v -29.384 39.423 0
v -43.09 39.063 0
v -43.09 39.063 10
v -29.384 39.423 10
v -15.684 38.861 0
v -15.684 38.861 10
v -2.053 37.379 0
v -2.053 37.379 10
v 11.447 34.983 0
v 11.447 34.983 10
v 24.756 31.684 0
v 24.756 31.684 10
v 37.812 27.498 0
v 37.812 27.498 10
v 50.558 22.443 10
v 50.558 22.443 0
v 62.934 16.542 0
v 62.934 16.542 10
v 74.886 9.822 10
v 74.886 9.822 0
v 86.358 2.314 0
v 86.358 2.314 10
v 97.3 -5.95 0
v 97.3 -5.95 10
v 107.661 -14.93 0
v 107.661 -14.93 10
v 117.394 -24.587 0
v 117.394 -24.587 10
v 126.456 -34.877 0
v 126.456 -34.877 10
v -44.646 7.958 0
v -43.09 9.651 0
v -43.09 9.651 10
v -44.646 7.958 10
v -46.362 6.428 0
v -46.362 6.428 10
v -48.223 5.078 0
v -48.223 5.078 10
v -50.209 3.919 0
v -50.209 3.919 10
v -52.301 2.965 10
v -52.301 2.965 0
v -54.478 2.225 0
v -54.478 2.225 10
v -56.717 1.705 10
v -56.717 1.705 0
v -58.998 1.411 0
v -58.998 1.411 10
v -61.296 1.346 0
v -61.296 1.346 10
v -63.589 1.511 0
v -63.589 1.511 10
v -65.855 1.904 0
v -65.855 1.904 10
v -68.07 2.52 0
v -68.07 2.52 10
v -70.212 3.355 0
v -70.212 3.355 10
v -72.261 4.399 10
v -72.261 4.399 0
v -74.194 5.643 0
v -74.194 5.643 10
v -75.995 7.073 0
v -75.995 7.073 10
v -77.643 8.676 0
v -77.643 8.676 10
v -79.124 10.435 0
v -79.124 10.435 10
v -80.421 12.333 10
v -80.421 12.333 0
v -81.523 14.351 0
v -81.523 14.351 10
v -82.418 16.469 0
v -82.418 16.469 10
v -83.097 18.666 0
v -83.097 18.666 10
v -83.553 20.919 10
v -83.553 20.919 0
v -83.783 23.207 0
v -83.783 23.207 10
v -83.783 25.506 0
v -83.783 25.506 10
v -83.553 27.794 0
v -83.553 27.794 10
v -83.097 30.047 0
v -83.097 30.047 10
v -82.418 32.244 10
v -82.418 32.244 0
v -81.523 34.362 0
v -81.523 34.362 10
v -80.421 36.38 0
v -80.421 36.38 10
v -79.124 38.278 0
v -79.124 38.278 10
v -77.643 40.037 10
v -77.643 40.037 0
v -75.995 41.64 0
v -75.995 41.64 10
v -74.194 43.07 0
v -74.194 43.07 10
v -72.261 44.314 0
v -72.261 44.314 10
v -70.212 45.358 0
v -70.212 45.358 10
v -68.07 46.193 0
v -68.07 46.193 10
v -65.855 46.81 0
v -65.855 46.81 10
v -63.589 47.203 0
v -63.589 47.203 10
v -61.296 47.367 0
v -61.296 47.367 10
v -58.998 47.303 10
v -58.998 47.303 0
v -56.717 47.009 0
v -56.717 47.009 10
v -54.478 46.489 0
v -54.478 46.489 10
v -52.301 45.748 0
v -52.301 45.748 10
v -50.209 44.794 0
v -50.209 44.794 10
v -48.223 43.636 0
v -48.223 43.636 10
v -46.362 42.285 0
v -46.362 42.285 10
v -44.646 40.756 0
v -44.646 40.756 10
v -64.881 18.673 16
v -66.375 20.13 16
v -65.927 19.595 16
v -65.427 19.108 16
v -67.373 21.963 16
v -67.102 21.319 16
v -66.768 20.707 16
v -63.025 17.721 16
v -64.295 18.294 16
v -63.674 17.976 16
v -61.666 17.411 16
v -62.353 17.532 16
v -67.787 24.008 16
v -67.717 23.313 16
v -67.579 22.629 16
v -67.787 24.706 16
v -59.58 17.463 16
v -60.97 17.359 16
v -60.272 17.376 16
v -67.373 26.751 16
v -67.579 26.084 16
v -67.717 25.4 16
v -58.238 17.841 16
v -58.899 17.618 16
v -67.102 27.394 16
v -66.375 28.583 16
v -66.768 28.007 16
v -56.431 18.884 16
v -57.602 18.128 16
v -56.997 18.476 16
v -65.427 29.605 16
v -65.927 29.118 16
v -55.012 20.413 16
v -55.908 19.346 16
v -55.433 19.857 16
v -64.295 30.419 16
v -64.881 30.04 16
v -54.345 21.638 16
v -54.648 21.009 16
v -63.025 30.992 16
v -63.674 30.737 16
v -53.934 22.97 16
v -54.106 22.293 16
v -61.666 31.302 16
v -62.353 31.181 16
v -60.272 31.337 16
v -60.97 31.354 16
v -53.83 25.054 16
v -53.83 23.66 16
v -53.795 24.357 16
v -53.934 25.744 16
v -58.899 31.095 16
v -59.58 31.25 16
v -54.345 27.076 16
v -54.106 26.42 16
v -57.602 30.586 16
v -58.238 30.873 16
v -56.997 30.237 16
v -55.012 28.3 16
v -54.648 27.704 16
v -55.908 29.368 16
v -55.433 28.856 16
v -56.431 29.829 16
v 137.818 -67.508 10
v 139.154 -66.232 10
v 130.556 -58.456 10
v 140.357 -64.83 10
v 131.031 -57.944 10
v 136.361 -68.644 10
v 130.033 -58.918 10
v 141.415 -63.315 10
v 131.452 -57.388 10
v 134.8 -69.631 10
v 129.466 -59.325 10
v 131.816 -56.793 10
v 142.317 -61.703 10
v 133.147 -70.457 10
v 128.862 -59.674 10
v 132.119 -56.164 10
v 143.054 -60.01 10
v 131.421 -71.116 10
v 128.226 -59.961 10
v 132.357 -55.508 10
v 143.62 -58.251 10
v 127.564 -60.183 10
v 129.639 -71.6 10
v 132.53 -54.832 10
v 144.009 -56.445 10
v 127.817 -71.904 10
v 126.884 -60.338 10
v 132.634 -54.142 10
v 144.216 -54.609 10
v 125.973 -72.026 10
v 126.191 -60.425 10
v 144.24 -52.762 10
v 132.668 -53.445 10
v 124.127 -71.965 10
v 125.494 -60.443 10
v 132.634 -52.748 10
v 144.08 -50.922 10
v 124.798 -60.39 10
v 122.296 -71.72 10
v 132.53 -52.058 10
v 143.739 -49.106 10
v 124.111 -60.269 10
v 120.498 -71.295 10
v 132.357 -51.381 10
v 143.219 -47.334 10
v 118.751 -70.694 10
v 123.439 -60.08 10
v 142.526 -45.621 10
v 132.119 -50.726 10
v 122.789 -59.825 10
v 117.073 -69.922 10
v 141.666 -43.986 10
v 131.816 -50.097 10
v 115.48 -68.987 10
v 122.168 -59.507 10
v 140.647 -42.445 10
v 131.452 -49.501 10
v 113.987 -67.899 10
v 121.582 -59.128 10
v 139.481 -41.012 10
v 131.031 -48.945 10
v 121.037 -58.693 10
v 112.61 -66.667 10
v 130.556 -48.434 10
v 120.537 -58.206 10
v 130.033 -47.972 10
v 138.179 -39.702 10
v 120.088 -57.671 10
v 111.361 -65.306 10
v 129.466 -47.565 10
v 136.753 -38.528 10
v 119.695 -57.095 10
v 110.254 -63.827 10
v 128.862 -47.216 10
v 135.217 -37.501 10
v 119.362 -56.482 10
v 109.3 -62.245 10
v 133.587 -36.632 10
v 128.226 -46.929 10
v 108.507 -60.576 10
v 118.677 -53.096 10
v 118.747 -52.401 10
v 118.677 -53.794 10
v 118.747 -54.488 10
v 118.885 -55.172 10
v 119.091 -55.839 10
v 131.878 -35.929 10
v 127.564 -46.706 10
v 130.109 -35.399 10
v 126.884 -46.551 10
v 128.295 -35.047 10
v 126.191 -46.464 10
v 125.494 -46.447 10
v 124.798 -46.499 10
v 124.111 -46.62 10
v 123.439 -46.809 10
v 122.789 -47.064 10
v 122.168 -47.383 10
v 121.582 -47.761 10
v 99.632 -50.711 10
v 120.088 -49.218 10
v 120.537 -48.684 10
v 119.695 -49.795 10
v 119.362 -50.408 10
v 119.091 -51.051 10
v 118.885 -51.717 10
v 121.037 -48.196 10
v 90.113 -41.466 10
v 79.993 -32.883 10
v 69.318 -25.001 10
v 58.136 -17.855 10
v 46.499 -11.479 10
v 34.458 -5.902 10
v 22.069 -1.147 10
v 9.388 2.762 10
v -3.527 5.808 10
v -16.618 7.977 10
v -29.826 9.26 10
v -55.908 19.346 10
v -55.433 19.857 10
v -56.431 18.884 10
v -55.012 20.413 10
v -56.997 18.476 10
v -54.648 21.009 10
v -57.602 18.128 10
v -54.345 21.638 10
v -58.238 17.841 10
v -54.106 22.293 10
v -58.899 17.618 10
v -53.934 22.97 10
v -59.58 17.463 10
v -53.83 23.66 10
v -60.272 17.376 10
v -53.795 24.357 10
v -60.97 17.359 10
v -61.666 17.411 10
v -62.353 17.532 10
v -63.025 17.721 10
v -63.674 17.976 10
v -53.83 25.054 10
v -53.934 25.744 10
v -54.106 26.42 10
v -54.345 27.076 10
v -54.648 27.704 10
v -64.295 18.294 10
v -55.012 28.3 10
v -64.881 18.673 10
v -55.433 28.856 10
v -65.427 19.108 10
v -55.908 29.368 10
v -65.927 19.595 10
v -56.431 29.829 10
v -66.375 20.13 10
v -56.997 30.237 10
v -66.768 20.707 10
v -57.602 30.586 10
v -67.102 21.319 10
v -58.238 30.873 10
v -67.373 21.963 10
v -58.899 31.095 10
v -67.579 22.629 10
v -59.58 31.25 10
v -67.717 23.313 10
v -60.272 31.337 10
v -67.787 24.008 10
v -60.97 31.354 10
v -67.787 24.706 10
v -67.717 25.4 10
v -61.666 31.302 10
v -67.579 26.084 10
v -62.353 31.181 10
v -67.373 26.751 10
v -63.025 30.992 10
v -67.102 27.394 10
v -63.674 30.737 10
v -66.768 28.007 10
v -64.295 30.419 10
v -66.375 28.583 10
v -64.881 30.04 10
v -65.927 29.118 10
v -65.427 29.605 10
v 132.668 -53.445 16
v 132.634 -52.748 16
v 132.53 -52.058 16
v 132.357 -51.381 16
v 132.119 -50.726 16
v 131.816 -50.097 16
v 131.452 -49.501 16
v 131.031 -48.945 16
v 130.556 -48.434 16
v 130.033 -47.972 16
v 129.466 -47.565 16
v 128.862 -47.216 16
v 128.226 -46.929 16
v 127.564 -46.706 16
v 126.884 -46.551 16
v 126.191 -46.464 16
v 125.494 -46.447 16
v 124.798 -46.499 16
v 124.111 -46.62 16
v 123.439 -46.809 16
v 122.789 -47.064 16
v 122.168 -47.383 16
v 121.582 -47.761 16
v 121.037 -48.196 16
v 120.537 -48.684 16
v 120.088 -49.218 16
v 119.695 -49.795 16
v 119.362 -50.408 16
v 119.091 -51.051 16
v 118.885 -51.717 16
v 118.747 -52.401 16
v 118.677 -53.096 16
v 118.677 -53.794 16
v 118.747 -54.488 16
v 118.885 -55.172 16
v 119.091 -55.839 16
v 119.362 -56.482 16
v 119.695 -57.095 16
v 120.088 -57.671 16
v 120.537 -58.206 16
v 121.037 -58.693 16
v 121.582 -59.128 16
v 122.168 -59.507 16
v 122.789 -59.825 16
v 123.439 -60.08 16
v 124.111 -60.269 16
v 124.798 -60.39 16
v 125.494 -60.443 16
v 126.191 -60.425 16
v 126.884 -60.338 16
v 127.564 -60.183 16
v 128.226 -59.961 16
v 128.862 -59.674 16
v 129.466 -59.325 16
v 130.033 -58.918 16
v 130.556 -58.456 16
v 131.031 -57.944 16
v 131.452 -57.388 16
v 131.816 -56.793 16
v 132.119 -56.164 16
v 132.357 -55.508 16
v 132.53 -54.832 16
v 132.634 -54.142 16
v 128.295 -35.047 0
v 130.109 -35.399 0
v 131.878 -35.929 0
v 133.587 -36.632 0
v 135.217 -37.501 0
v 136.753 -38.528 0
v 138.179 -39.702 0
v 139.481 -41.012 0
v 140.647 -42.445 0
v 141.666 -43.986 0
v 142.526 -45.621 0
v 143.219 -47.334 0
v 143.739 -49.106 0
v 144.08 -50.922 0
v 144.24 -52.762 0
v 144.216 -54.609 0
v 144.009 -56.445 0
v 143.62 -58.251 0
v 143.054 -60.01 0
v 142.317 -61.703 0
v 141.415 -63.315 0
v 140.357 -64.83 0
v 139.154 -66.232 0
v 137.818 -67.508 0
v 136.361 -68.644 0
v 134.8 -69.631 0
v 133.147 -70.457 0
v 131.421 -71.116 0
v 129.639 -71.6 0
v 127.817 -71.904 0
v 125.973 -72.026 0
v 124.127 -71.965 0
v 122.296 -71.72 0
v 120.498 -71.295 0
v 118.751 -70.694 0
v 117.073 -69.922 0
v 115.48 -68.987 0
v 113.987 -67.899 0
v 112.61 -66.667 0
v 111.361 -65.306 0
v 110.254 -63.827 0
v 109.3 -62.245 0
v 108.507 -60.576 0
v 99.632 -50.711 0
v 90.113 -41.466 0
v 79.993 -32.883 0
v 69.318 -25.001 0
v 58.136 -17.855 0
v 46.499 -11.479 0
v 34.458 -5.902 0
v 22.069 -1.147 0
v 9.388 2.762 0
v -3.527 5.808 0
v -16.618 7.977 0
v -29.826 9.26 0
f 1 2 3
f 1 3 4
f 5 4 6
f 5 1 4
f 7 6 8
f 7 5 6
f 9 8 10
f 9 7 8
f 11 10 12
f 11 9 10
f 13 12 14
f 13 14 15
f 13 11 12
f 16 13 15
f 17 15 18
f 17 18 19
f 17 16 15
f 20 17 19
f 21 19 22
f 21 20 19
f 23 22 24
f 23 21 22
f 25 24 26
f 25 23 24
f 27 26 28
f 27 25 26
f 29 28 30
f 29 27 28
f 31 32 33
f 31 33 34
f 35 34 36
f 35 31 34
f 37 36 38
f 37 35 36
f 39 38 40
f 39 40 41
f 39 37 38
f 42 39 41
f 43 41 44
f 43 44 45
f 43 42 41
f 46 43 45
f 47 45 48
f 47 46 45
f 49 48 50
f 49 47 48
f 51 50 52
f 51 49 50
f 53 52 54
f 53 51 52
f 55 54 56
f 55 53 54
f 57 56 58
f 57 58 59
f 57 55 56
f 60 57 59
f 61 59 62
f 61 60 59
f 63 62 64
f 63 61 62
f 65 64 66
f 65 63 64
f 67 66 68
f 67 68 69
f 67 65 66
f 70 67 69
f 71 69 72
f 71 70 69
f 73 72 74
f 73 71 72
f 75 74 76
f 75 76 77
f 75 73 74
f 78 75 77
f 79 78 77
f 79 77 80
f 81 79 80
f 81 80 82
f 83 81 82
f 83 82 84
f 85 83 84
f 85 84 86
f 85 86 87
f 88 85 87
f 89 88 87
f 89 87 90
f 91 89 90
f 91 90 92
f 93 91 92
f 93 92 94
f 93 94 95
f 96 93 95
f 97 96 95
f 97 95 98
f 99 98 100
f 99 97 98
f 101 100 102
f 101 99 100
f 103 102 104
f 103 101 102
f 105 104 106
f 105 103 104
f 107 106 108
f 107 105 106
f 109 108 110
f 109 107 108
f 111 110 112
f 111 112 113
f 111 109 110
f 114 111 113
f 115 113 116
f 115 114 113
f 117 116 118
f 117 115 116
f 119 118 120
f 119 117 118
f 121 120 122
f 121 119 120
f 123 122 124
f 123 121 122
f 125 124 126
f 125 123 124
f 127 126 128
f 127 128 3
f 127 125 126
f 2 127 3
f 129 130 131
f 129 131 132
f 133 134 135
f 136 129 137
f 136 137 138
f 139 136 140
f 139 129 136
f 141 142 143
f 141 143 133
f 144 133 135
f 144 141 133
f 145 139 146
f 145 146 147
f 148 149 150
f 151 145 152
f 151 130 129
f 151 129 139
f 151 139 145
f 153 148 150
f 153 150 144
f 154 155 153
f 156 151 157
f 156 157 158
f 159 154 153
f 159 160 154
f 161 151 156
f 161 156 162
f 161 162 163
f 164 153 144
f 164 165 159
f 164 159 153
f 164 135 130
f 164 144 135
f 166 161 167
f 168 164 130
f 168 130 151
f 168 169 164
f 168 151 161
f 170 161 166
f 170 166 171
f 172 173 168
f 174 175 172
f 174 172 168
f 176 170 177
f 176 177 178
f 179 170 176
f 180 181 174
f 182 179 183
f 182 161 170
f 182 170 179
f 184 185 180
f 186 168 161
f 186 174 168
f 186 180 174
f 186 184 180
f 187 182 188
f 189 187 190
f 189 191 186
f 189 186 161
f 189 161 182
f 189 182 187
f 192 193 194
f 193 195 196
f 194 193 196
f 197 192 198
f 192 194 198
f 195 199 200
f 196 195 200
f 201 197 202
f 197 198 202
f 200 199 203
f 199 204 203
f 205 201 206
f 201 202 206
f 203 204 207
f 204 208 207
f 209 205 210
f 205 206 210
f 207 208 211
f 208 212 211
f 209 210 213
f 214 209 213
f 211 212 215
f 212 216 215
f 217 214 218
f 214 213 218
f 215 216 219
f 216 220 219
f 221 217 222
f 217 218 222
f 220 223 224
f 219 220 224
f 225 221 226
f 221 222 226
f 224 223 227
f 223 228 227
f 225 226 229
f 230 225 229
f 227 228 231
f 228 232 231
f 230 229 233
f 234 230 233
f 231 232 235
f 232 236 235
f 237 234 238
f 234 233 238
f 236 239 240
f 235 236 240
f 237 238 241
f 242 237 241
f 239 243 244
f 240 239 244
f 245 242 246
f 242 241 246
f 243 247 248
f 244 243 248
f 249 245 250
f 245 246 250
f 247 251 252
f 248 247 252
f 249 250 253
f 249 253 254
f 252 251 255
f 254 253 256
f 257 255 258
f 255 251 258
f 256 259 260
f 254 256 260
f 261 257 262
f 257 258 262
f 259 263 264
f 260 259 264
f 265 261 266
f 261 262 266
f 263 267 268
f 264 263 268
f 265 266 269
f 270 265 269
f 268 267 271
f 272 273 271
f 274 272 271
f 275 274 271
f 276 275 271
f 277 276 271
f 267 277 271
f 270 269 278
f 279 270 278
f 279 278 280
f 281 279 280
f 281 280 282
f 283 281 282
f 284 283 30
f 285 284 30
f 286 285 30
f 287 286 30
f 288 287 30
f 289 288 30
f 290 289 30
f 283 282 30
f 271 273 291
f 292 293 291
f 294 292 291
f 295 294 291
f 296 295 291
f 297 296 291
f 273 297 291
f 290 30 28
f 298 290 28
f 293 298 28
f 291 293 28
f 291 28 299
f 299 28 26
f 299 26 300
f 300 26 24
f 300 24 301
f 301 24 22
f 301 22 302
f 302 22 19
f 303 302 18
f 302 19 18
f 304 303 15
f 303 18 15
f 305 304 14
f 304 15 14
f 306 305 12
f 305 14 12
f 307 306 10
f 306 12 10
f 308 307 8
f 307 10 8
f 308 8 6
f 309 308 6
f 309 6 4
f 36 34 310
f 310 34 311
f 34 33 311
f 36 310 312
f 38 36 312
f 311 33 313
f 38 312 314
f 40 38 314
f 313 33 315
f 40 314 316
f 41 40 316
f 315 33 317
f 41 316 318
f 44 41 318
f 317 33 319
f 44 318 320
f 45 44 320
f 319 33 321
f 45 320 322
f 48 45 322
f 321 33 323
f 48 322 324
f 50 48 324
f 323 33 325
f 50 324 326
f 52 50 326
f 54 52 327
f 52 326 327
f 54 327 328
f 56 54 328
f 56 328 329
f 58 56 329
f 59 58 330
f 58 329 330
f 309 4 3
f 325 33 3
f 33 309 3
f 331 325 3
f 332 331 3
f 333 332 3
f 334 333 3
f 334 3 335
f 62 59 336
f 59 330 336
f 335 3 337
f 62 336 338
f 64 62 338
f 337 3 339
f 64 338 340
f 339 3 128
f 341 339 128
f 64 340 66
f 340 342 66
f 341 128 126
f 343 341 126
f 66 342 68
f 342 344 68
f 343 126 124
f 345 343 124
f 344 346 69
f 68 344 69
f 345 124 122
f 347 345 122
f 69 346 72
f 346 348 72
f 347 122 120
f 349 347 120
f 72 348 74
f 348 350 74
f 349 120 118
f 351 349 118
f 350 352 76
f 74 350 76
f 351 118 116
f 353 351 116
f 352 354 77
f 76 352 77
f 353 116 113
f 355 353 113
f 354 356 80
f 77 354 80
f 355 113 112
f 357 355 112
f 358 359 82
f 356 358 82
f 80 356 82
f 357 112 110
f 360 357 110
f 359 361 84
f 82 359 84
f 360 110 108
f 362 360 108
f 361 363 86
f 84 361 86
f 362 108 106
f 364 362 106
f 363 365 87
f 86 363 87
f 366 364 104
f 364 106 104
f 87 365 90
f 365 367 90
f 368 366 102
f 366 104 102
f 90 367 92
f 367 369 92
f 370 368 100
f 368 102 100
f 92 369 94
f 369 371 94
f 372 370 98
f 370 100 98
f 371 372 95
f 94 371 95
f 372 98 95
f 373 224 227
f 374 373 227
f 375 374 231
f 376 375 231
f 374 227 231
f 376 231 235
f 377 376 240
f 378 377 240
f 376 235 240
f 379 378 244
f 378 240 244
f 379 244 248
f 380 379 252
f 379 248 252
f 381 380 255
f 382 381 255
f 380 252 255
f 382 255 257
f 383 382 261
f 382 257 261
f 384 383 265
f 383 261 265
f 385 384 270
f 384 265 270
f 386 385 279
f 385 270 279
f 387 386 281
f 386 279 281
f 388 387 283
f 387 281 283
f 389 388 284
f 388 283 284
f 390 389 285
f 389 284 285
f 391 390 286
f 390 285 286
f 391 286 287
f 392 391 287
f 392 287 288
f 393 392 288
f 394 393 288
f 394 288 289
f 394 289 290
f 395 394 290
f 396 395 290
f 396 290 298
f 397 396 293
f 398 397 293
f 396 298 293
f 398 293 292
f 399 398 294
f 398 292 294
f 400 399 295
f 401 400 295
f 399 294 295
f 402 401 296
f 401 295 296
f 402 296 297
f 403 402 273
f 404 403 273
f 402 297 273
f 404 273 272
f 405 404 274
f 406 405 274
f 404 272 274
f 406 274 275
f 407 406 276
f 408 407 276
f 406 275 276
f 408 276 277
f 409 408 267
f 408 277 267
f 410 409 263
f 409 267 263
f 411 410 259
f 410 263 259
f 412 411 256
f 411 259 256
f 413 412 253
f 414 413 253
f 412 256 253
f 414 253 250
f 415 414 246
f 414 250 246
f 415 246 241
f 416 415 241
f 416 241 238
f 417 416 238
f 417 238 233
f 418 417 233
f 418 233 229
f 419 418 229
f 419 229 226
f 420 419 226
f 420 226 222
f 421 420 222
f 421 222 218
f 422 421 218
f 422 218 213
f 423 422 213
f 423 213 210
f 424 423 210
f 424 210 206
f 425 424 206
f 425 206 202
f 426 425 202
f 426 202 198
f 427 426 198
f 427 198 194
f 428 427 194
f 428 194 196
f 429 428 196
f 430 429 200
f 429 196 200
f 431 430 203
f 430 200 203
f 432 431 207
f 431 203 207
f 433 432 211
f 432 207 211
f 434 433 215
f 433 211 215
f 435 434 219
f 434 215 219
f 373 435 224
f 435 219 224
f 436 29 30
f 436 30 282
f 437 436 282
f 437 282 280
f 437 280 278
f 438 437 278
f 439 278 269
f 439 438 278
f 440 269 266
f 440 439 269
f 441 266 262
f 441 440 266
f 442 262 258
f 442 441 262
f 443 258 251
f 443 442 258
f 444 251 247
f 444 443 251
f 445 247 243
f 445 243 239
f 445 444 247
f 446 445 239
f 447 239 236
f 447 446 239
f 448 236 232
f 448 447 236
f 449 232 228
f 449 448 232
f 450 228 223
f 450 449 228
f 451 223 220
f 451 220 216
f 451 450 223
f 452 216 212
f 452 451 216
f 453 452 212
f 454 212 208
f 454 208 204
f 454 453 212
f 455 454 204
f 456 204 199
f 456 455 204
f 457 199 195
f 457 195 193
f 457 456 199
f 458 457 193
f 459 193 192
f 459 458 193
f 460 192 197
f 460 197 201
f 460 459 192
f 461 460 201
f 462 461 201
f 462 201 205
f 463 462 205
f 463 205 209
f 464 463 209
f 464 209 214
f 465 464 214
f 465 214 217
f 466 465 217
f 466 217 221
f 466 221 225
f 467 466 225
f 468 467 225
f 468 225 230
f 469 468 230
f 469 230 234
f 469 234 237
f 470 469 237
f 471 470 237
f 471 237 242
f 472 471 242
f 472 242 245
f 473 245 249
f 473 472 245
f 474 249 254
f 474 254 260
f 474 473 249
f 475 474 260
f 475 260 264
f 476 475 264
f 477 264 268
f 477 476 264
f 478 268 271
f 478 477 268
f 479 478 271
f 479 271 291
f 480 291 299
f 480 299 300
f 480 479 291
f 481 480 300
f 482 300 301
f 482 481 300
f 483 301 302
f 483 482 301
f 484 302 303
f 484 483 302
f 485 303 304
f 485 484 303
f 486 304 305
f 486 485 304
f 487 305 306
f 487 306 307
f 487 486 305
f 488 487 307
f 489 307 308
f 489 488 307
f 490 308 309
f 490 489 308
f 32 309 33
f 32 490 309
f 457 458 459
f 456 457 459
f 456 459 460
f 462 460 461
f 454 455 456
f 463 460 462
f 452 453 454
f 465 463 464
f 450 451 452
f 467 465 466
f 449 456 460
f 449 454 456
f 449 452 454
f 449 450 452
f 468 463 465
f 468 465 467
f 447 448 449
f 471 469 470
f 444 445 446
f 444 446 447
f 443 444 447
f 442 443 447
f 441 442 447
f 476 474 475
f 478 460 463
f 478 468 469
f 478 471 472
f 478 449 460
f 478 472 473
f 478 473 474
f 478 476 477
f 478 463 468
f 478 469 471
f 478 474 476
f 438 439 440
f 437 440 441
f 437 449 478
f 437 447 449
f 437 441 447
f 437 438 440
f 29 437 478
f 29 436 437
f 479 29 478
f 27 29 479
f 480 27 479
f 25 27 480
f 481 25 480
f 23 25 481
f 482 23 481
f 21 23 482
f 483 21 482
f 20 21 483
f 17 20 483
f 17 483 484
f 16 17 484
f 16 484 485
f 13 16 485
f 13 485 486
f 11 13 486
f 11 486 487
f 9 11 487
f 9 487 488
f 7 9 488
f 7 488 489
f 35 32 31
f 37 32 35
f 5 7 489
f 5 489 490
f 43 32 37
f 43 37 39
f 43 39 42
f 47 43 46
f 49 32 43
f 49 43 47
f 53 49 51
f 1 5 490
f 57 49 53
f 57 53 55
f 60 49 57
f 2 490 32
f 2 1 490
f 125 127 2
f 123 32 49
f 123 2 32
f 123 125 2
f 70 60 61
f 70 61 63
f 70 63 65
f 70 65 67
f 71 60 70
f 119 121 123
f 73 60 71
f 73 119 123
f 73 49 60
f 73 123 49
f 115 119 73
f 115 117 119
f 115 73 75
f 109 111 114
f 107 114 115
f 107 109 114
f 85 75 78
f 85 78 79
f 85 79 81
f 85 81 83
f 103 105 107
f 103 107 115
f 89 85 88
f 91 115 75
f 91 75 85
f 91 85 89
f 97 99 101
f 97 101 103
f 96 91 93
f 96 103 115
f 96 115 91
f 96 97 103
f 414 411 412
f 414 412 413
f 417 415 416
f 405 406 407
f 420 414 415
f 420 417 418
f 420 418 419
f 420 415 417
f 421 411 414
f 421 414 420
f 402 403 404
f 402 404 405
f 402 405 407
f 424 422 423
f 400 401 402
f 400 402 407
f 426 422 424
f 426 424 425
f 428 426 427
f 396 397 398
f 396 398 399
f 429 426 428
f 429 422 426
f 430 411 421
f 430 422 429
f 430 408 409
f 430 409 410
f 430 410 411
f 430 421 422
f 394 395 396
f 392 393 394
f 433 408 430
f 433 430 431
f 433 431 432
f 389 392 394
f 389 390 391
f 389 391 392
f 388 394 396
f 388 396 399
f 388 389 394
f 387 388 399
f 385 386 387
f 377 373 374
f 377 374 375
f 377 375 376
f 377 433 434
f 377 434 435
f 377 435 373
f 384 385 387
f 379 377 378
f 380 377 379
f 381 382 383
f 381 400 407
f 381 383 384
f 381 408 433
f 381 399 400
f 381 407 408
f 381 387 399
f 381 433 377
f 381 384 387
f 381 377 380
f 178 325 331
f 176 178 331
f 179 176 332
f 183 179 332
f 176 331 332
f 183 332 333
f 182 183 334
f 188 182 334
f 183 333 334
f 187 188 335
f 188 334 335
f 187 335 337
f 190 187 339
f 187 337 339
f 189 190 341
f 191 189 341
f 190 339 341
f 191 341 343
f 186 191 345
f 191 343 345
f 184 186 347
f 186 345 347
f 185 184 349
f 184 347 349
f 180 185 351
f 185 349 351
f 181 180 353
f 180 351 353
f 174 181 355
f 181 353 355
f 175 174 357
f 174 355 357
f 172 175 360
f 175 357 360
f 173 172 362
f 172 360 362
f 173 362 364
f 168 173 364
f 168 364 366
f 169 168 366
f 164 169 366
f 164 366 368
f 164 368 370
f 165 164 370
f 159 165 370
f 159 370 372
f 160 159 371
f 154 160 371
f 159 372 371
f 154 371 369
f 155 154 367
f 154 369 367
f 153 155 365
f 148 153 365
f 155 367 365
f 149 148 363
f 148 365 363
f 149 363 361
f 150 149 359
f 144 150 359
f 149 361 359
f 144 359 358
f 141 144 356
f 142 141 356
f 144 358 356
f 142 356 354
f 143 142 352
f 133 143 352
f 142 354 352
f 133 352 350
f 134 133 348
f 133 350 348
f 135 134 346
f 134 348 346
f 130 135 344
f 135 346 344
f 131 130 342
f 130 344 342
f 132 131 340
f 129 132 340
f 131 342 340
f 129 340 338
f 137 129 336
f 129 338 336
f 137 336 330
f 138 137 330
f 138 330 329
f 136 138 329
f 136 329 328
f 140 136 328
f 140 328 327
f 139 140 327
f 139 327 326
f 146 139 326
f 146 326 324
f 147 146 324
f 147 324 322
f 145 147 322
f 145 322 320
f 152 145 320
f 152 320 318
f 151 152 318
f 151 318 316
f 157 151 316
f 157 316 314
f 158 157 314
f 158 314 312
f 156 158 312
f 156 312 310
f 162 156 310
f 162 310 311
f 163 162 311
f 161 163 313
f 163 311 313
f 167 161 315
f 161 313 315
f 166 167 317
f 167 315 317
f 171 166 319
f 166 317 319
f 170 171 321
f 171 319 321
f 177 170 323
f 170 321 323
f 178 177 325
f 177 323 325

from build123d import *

# Parameters (mm, degrees)
BOSS_EXTRUDE1_DEPTH = 10
SKETCH2_R           = 7
BOSS_EXTRUDE2_DEPTH = 6


with BuildPart() as part:
    # Sketch1 → Boss-Extrude1 (new body)
    with BuildSketch(Plane.XY):
        with BuildLine():
            ThreePointArc((-43.08998785, 39.062645298), (50.557727896, 22.443015988), (126.455624698, -34.877277135))
            ThreePointArc((126.455624698, -34.877277135), (140.904450524, -64.085787948), (108.507084419, -60.576323444))
            ThreePointArc((108.507084419, -60.576323444), (40.525240485, -8.589143953), (-43.08998785, 9.650689563))
            ThreePointArc((-43.08998785, 9.650689563), (-83.811407941, 24.356667431), (-43.08998785, 39.062645298))
        make_face()
    extrude(amount=BOSS_EXTRUDE1_DEPTH)

    # Sketch2 → Boss-Extrude2 (add)
    with BuildSketch(Plane.XY.offset(10)):
        with Locations((125.668384571, -53.444726012)):
            Circle(SKETCH2_R)
        with Locations((-60.795267601, 24.356667431)):
            Circle(SKETCH2_R)
    extrude(amount=BOSS_EXTRUDE2_DEPTH)


solid = part.part
